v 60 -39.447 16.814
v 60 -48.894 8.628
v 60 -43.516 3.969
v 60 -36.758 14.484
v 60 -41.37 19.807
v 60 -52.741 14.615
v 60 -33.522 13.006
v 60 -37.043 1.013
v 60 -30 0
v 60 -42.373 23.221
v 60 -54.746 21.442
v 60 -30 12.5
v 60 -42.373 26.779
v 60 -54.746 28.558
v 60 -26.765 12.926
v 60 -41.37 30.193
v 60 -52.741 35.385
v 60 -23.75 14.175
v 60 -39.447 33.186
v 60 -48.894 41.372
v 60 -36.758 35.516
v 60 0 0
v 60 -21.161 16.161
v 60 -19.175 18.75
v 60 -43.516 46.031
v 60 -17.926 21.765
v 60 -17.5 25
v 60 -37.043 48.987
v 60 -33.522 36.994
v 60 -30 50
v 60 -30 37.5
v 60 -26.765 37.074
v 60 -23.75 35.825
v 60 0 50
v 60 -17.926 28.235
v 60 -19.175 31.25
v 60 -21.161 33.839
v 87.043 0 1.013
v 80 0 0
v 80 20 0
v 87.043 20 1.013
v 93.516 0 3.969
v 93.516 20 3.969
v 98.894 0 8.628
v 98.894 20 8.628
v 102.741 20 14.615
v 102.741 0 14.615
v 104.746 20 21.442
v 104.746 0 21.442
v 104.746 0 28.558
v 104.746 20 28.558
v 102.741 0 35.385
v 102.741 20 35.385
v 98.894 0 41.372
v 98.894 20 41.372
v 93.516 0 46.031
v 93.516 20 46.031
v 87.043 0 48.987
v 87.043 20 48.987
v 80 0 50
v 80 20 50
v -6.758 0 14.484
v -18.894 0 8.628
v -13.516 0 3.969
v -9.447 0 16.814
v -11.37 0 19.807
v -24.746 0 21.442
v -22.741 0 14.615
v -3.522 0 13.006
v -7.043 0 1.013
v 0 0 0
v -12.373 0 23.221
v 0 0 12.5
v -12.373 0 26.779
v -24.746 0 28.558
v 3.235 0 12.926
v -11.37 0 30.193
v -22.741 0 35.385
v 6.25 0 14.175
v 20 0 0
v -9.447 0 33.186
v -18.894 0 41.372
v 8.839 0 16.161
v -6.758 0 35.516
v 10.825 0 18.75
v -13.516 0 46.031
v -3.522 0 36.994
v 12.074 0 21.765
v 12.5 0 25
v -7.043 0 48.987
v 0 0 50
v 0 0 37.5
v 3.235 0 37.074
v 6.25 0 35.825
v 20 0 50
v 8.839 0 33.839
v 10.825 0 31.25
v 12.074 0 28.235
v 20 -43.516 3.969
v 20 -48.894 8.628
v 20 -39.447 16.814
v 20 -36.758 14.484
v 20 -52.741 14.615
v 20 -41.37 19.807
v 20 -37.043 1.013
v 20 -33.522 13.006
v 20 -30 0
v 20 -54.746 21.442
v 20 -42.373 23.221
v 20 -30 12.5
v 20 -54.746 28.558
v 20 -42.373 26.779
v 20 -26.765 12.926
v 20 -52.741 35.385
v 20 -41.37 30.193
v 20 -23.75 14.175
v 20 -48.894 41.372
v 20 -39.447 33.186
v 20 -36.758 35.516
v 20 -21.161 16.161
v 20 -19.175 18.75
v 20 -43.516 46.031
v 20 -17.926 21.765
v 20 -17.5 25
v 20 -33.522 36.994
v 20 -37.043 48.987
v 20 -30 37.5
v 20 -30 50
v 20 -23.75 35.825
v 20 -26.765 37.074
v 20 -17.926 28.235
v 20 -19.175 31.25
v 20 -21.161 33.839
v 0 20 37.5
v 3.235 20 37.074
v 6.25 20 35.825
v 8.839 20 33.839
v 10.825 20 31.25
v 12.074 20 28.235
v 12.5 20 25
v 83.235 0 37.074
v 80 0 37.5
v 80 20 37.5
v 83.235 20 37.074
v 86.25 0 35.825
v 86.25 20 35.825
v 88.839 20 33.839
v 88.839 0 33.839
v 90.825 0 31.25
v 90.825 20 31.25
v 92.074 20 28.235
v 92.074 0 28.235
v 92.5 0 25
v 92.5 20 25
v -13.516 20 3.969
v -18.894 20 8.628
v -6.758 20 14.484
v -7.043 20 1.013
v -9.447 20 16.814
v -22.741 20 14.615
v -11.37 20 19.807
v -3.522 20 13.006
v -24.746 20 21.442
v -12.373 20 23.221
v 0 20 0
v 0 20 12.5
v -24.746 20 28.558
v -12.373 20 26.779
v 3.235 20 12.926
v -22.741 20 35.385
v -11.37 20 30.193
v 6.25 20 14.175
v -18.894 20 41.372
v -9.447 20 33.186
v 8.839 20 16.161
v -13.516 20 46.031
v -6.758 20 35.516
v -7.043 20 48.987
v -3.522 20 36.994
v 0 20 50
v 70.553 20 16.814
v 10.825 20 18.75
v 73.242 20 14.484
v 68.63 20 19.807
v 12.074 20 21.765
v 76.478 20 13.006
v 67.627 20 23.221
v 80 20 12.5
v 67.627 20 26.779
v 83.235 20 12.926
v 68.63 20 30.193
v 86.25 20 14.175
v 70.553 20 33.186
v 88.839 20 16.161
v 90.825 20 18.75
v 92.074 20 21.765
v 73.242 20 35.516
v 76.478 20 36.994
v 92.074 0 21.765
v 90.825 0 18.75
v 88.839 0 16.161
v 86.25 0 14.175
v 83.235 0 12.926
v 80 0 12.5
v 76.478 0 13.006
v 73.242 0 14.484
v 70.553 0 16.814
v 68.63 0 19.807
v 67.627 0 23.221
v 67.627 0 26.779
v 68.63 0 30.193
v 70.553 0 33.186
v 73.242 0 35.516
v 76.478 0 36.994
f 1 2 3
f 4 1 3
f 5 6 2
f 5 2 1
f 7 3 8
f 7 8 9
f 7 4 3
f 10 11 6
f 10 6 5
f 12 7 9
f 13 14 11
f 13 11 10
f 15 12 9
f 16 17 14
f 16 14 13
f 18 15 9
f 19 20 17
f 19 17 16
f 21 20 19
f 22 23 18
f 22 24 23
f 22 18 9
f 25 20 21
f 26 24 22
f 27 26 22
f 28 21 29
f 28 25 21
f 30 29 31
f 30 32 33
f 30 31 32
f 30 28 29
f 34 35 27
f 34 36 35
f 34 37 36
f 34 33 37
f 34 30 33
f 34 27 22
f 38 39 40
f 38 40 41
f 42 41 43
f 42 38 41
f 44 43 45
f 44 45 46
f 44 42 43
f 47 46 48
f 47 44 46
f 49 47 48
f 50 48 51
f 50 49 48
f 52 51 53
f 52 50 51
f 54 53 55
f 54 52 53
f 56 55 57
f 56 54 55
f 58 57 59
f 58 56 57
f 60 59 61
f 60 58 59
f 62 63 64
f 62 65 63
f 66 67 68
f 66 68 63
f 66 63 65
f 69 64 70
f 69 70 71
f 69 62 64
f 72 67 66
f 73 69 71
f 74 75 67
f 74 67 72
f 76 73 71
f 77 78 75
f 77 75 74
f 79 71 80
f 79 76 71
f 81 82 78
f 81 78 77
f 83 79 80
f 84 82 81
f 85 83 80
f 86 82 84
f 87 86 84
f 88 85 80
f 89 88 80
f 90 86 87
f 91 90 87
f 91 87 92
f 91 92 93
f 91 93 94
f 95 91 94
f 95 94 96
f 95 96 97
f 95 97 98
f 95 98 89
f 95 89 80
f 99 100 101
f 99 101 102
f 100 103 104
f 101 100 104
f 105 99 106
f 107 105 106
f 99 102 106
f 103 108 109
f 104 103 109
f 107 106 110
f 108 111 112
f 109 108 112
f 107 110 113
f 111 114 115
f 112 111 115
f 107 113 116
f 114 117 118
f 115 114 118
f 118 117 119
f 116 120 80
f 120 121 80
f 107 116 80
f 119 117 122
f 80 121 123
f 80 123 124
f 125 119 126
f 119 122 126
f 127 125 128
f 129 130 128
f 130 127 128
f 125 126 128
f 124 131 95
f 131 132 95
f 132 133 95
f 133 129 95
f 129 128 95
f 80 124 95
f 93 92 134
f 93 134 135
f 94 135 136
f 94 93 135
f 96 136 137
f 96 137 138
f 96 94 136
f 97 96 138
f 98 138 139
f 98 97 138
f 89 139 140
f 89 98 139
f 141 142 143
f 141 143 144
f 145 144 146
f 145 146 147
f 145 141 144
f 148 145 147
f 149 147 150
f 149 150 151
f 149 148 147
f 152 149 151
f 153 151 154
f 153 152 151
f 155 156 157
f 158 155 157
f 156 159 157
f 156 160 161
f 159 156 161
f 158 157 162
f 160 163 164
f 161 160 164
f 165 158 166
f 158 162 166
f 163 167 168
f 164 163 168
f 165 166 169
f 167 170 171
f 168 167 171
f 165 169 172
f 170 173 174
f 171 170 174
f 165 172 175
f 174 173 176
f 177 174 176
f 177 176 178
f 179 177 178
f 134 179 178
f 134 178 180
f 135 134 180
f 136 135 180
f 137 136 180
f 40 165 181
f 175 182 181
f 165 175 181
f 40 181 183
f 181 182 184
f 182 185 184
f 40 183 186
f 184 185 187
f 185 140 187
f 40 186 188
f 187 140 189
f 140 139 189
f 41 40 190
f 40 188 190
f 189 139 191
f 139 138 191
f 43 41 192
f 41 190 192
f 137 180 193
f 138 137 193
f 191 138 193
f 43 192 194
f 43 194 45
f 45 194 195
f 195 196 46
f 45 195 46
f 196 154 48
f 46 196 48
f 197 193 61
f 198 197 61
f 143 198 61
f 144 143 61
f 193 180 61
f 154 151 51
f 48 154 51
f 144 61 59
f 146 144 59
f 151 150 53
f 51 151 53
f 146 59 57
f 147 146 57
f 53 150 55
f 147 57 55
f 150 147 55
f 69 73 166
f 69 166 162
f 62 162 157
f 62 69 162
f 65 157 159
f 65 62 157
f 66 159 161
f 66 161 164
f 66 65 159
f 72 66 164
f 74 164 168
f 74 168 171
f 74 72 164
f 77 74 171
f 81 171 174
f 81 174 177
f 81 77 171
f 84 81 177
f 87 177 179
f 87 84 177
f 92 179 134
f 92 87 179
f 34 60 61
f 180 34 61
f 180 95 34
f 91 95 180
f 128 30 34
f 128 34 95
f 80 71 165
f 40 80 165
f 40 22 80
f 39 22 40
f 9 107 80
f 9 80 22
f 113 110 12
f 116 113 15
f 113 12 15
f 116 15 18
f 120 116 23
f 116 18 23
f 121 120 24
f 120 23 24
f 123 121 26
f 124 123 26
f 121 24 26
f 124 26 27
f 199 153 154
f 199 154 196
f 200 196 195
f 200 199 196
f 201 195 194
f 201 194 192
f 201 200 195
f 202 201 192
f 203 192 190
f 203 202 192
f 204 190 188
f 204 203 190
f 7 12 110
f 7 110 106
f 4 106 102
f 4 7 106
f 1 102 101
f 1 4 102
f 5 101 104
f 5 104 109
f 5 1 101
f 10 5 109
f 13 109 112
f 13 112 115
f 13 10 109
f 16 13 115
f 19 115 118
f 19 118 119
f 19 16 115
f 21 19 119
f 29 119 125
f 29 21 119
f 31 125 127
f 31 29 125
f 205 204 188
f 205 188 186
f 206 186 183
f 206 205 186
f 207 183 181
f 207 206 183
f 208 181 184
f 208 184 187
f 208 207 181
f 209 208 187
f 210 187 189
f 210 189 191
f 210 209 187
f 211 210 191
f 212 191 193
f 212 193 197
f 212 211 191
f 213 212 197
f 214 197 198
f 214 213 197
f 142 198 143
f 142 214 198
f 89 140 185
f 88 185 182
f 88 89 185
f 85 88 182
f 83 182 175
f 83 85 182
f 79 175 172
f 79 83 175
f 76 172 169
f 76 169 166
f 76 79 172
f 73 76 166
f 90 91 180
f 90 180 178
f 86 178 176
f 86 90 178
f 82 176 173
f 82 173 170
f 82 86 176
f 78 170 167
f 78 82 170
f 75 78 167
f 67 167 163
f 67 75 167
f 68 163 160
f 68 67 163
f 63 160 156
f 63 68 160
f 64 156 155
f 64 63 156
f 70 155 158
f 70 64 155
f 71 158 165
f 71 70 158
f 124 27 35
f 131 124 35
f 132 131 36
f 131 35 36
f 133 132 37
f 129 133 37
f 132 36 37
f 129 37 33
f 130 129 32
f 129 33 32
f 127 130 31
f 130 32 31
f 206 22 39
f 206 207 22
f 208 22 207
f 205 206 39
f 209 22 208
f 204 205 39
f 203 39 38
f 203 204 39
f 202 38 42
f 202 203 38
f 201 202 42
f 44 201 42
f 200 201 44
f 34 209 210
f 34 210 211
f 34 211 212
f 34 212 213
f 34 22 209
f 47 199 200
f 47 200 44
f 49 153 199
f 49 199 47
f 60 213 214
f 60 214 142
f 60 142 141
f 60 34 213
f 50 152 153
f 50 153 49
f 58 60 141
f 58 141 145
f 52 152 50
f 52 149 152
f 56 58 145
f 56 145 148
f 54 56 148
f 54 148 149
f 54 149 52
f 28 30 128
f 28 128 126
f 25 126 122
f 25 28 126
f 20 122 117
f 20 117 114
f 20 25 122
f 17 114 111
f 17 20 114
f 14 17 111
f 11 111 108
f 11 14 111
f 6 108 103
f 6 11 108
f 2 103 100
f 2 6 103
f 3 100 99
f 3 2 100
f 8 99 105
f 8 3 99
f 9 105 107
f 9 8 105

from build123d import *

# Parameters (mm, degrees)
F0_W     = 40
F0_H     = 50
F1_DEPTH = 20
F2_DEPTH = 30
F4_DEPTH = 40
F5_DEPTH = 40


with BuildPart() as f1:
    # F0 (on Front) → F1 (new body)
    with BuildSketch(Plane.XZ):
        with BuildLine():
            ThreePointArc((0, 50), (-25, 25), (0, 0))
            Line((0, 0), (0, 12.5))
            ThreePointArc((0, 12.5), (-12.5, 25), (0, 37.5))
            Line((0, 37.5), (0, 50))
        make_face()
        with BuildLine():
            Line((0, 12.5), (0, 0))
            Line((0, 0), (20, 0))
            Line((20, 0), (20, 50))
            Line((20, 50), (0, 50))
            Line((0, 50), (0, 37.5))
            ThreePointArc((0, 37.5), (8.8388347648, 33.8388347648), (12.5, 25))
            ThreePointArc((12.5, 25), (8.8388347648, 16.1611652352), (0, 12.5))
        make_face()
        with Locations((40, 25)):
            Rectangle(F0_W, F0_H)
        with BuildLine():
            Line((60, 50), (60, 0))
            Line((60, 0), (80, 0))
            Line((80, 0), (80, 12.5))
            ThreePointArc((80, 12.5), (67.5, 25), (80, 37.5))
            Line((80, 37.5), (80, 50))
            Line((80, 50), (60, 50))
        make_face()
        with BuildLine():
            Line((80, 12.5), (80, 0))
            ThreePointArc((80, 0), (105, 25), (80, 50))
            Line((80, 50), (80, 37.5))
            ThreePointArc((80, 37.5), (88.8388347648, 33.8388347648), (92.5, 25))
            ThreePointArc((92.5, 25), (88.8388347648, 16.1611652352), (80, 12.5))
        make_face()
    extrude(amount=-F1_DEPTH)

    # F0 (on Front) → F2 (join)
    with BuildSketch(Plane.XZ):
        with Locations((40, 25)):
            Rectangle(F0_W, F0_H)
    extrude(amount=F2_DEPTH)

    # F3 (on face) → F4 (join)
    with BuildSketch(Plane.YZ.offset(60)):
        with BuildLine():
            Line((-30, 37.5), (-30, 50))
            ThreePointArc((-30, 50), (-55, 25), (-30, 0))
            Line((-30, 0), (-30, 12.5))
            ThreePointArc((-30, 12.5), (-42.5, 25), (-30, 37.5))
        make_face()
    extrude(amount=-F4_DEPTH)

    # F3 (on face) → F5 (cut)
    with BuildSketch(Plane.YZ.offset(60)):
        with BuildLine():
            ThreePointArc((-17.5, 25), (-21.1611652352, 33.8388347648), (-30, 37.5))
            Line((-30, 37.5), (-30, 12.5))
            ThreePointArc((-30, 12.5), (-21.1611652352, 16.1611652352), (-17.5, 25))
        make_face()
    extrude(amount=-F5_DEPTH, mode=Mode.SUBTRACT)


solid = f1.part
